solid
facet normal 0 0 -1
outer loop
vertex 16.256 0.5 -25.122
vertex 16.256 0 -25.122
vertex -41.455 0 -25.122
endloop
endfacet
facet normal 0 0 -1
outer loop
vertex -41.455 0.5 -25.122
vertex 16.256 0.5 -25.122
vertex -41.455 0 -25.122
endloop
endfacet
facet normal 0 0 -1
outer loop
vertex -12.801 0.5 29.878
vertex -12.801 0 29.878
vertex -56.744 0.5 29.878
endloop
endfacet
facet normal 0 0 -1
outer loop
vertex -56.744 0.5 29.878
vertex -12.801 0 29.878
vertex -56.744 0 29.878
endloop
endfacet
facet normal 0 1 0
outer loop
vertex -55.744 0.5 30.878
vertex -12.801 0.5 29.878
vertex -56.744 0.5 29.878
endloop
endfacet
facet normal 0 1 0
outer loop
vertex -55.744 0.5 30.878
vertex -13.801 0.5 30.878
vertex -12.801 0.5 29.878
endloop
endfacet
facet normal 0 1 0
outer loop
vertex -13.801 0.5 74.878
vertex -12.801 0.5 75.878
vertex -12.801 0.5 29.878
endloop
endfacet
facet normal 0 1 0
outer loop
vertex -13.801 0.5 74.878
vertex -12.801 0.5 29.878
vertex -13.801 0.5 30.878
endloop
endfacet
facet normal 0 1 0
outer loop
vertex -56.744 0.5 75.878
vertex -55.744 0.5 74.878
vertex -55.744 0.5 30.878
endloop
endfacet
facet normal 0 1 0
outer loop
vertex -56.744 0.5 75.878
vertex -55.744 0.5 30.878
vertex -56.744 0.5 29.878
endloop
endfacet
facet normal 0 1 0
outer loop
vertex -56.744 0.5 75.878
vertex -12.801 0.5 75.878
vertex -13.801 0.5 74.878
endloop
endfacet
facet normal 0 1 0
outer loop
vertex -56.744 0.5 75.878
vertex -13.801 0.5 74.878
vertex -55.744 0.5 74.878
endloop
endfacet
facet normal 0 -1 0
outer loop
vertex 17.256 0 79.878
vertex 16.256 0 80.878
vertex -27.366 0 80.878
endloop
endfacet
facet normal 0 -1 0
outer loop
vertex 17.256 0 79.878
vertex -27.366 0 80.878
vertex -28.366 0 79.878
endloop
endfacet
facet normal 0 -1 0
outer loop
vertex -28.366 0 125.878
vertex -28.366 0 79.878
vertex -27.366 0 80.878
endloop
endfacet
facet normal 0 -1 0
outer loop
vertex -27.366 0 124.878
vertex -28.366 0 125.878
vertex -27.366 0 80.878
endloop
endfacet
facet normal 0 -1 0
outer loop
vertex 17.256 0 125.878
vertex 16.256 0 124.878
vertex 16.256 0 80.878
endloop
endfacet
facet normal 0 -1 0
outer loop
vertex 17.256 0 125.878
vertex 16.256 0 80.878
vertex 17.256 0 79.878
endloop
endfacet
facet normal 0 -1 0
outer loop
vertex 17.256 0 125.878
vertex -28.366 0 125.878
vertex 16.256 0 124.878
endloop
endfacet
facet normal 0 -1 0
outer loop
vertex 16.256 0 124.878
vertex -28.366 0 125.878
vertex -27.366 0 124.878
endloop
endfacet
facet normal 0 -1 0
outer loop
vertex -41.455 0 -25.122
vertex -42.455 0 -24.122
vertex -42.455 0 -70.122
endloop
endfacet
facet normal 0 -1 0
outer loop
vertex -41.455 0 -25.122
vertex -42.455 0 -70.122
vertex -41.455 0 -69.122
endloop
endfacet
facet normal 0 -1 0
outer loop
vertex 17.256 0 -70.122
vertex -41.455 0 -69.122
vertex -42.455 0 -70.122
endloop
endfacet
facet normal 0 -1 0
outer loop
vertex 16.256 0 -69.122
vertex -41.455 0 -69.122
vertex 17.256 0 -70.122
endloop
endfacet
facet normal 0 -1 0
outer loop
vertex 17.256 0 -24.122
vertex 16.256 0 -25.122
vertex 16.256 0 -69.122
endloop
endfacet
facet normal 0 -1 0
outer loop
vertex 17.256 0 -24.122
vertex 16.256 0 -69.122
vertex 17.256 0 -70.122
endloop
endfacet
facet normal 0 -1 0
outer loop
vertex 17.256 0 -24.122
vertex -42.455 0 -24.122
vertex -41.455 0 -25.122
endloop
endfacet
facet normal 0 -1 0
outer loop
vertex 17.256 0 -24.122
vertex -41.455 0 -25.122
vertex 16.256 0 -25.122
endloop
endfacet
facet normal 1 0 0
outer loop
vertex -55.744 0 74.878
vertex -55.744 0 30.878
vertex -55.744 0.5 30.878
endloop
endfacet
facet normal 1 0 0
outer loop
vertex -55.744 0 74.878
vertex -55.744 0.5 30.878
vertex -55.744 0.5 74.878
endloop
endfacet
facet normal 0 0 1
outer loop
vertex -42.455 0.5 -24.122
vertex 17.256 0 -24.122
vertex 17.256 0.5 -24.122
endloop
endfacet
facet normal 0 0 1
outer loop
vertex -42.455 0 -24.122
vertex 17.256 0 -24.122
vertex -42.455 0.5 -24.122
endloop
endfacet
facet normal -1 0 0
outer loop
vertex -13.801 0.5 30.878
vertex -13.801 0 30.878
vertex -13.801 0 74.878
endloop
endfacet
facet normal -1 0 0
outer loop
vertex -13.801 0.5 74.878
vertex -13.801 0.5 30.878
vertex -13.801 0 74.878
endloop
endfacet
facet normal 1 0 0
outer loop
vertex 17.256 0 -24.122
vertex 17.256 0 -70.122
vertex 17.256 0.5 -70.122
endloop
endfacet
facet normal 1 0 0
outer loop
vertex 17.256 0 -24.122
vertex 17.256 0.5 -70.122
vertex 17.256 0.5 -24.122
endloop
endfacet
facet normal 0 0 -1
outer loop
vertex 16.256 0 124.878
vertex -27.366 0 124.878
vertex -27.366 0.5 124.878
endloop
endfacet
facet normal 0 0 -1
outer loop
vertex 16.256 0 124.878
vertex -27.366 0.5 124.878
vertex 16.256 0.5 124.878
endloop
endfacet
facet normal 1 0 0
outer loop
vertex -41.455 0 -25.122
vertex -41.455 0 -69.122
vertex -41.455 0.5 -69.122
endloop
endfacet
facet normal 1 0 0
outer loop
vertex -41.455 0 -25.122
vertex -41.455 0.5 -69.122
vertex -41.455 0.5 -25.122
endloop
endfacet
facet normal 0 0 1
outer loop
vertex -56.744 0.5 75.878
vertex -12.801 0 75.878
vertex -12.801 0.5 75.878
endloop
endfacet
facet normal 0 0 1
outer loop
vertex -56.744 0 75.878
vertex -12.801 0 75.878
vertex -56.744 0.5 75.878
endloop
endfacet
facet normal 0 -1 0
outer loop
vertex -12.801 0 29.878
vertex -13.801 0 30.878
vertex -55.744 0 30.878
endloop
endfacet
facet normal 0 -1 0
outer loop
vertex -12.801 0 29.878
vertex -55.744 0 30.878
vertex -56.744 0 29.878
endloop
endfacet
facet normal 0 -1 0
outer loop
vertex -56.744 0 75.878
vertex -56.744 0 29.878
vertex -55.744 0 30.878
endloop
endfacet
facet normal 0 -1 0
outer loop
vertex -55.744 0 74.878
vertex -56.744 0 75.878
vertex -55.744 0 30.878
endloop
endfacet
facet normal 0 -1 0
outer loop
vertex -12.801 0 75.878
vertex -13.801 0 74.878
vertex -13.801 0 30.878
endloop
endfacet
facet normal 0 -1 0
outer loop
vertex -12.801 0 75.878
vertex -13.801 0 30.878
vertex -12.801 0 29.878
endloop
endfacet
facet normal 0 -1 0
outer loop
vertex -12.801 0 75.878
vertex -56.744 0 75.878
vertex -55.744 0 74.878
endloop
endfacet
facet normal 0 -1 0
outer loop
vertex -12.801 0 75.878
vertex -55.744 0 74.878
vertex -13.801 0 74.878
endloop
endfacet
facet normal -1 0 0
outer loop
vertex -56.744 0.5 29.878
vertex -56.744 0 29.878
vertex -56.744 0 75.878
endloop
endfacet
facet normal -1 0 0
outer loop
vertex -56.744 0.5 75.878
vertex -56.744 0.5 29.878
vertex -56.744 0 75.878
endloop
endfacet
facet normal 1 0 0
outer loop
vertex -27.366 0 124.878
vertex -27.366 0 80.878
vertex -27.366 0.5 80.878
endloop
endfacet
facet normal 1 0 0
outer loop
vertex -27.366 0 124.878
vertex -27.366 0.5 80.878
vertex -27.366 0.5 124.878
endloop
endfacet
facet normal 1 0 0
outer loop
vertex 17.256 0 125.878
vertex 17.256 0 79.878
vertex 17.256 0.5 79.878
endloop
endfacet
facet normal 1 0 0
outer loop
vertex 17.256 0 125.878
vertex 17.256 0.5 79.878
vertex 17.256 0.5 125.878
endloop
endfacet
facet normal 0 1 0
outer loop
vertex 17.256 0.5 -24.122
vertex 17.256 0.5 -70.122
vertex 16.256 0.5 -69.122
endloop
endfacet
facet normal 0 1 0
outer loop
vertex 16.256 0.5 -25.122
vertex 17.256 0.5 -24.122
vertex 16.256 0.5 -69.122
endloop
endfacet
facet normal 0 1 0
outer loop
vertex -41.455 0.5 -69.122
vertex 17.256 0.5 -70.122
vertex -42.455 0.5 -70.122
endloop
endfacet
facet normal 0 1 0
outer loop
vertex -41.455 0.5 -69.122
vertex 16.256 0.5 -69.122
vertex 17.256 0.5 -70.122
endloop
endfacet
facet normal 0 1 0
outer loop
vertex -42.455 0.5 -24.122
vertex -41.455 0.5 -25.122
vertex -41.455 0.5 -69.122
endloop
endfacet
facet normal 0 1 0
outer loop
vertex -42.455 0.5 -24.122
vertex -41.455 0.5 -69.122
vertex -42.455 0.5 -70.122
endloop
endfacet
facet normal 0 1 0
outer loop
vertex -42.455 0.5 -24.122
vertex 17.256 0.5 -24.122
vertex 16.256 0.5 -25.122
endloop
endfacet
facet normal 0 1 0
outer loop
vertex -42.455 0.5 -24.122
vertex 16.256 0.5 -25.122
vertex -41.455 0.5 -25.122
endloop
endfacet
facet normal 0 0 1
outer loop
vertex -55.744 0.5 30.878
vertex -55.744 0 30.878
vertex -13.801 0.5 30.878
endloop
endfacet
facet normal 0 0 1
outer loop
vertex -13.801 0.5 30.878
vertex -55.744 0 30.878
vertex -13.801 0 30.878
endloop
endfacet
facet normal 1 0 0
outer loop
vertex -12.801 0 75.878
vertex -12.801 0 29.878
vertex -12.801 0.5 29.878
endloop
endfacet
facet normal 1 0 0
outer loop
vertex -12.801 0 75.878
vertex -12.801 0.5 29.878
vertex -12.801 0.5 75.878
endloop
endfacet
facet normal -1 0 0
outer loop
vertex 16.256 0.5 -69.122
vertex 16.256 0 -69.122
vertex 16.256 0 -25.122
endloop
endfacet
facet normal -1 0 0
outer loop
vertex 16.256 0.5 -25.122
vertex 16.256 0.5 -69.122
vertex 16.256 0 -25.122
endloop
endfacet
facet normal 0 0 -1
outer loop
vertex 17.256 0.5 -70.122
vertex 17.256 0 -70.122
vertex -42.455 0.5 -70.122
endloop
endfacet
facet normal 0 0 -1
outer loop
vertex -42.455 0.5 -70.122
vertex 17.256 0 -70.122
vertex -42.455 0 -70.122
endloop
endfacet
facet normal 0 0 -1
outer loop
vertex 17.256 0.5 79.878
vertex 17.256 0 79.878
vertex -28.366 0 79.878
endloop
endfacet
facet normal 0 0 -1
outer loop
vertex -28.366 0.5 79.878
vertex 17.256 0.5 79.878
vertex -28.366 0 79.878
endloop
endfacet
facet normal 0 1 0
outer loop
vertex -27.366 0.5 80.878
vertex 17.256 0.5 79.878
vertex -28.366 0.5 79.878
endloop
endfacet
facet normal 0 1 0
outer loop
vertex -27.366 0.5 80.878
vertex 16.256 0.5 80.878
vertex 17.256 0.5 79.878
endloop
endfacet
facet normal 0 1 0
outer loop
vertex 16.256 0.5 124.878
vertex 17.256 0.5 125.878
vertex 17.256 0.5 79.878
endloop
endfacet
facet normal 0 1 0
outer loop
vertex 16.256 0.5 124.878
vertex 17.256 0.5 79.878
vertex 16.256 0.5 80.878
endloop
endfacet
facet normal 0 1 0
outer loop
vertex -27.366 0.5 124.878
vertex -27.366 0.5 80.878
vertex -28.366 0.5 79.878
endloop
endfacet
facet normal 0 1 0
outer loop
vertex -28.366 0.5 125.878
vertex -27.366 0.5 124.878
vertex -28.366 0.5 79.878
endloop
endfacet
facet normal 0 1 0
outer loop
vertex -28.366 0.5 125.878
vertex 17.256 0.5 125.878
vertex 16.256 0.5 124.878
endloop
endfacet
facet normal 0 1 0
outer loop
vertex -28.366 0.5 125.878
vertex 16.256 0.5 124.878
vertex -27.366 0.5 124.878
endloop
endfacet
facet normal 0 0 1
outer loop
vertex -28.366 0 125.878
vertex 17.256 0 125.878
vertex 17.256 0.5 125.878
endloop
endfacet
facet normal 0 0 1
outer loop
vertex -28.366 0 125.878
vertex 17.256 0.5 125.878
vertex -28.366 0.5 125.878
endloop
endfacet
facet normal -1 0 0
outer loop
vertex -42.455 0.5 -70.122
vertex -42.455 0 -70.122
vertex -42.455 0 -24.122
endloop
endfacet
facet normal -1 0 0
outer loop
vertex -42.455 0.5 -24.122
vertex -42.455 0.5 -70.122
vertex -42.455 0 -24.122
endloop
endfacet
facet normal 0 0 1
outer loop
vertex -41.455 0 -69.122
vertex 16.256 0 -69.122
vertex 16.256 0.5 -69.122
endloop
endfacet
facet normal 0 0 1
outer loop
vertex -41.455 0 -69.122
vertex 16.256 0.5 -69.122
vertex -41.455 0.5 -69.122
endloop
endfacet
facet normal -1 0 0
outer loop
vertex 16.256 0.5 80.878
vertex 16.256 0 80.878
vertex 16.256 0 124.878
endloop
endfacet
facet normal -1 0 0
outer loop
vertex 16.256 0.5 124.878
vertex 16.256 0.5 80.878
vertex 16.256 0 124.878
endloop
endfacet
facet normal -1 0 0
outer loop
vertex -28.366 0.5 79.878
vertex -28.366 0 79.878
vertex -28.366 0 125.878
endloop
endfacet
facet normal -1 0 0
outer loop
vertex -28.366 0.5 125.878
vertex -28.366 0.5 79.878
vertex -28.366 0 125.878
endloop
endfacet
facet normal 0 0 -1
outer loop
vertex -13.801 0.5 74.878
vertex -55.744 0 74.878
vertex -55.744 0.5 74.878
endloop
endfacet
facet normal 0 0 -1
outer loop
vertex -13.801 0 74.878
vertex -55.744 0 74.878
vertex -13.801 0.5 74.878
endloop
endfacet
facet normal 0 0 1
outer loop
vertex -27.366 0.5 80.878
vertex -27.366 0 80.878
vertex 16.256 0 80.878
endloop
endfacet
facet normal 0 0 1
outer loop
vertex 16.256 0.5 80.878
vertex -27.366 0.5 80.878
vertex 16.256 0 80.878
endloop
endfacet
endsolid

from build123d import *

# Parameters (mm, degrees)
F0_W     = 80
F0_H     = 202
F1_DEPTH = 3
F2_W     = 41.942806
F2_H     = 44
F2_W_2   = 43.622092
F3_DEPTH = 25
F5_W     = 59.710604
F5_H     = 46
F5_W_2   = 57.710604
F5_H_2   = 44
F5_W_3   = 43.942806
F5_W_4   = 41.942806
F5_W_5   = 45.622092
F5_W_6   = 43.622092
F6_DEPTH = 0.5
F7_W     = 109.326043
F7_H     = 224.900469
F8_DEPTH = 3


with BuildPart() as f1:
    # F0 (on Front) → F1 (new body)
    with BuildSketch(Plane.XZ):
        with Locations((-19.744222, 27.878283)):
            Rectangle(F0_W, F0_H)
    extrude(amount=F1_DEPTH)

    # F2 (on face) → F3 (cut)
    with BuildSketch(Plane.XZ.offset(3)):
        with Locations((-34.772819, 52.878283)):
            Rectangle(F2_W, F2_H)
        with Locations((-5.555268, 102.878283)):
            Rectangle(F2_W_2, F2_H)
        Polygon((16.255778, -25.121717), (-41.454826, -25.121717), (-41.454826, -42.175964), (-41.454826, -69.121717), (16.255778, -69.121717), align=None)
    extrude(amount=-F3_DEPTH, mode=Mode.SUBTRACT)

    # F5 (on face) → F6 (join)
    with BuildSketch(Plane(origin=(0, 0, 0), x_dir=(-1, 0, 0), z_dir=(0, 1, 0))):
        with Locations((12.599524, -47.121717)):
            Rectangle(F5_W, F5_H)
        with Locations((12.599524, -47.121717)):
            Rectangle(F5_W_2, F5_H_2, mode=Mode.SUBTRACT)
        with Locations((34.772819, 52.878283)):
            Rectangle(F5_W_3, F5_H)
        with Locations((34.772819, 52.878283)):
            Rectangle(F5_W_4, F5_H_2, mode=Mode.SUBTRACT)
        with Locations((5.555268, 102.878283)):
            Rectangle(F5_W_5, F5_H)
        with Locations((5.555268, 102.878283)):
            Rectangle(F5_W_6, F5_H_2, mode=Mode.SUBTRACT)
    extrude(amount=F6_DEPTH)

    # F7 (on face) → F8 (cut)
    with BuildSketch(Plane.XZ.offset(3)):
        with Locations((-18.837999, 26.267044)):
            Rectangle(F7_W, F7_H)
    extrude(amount=-F8_DEPTH, mode=Mode.SUBTRACT)


solid = f1.part
